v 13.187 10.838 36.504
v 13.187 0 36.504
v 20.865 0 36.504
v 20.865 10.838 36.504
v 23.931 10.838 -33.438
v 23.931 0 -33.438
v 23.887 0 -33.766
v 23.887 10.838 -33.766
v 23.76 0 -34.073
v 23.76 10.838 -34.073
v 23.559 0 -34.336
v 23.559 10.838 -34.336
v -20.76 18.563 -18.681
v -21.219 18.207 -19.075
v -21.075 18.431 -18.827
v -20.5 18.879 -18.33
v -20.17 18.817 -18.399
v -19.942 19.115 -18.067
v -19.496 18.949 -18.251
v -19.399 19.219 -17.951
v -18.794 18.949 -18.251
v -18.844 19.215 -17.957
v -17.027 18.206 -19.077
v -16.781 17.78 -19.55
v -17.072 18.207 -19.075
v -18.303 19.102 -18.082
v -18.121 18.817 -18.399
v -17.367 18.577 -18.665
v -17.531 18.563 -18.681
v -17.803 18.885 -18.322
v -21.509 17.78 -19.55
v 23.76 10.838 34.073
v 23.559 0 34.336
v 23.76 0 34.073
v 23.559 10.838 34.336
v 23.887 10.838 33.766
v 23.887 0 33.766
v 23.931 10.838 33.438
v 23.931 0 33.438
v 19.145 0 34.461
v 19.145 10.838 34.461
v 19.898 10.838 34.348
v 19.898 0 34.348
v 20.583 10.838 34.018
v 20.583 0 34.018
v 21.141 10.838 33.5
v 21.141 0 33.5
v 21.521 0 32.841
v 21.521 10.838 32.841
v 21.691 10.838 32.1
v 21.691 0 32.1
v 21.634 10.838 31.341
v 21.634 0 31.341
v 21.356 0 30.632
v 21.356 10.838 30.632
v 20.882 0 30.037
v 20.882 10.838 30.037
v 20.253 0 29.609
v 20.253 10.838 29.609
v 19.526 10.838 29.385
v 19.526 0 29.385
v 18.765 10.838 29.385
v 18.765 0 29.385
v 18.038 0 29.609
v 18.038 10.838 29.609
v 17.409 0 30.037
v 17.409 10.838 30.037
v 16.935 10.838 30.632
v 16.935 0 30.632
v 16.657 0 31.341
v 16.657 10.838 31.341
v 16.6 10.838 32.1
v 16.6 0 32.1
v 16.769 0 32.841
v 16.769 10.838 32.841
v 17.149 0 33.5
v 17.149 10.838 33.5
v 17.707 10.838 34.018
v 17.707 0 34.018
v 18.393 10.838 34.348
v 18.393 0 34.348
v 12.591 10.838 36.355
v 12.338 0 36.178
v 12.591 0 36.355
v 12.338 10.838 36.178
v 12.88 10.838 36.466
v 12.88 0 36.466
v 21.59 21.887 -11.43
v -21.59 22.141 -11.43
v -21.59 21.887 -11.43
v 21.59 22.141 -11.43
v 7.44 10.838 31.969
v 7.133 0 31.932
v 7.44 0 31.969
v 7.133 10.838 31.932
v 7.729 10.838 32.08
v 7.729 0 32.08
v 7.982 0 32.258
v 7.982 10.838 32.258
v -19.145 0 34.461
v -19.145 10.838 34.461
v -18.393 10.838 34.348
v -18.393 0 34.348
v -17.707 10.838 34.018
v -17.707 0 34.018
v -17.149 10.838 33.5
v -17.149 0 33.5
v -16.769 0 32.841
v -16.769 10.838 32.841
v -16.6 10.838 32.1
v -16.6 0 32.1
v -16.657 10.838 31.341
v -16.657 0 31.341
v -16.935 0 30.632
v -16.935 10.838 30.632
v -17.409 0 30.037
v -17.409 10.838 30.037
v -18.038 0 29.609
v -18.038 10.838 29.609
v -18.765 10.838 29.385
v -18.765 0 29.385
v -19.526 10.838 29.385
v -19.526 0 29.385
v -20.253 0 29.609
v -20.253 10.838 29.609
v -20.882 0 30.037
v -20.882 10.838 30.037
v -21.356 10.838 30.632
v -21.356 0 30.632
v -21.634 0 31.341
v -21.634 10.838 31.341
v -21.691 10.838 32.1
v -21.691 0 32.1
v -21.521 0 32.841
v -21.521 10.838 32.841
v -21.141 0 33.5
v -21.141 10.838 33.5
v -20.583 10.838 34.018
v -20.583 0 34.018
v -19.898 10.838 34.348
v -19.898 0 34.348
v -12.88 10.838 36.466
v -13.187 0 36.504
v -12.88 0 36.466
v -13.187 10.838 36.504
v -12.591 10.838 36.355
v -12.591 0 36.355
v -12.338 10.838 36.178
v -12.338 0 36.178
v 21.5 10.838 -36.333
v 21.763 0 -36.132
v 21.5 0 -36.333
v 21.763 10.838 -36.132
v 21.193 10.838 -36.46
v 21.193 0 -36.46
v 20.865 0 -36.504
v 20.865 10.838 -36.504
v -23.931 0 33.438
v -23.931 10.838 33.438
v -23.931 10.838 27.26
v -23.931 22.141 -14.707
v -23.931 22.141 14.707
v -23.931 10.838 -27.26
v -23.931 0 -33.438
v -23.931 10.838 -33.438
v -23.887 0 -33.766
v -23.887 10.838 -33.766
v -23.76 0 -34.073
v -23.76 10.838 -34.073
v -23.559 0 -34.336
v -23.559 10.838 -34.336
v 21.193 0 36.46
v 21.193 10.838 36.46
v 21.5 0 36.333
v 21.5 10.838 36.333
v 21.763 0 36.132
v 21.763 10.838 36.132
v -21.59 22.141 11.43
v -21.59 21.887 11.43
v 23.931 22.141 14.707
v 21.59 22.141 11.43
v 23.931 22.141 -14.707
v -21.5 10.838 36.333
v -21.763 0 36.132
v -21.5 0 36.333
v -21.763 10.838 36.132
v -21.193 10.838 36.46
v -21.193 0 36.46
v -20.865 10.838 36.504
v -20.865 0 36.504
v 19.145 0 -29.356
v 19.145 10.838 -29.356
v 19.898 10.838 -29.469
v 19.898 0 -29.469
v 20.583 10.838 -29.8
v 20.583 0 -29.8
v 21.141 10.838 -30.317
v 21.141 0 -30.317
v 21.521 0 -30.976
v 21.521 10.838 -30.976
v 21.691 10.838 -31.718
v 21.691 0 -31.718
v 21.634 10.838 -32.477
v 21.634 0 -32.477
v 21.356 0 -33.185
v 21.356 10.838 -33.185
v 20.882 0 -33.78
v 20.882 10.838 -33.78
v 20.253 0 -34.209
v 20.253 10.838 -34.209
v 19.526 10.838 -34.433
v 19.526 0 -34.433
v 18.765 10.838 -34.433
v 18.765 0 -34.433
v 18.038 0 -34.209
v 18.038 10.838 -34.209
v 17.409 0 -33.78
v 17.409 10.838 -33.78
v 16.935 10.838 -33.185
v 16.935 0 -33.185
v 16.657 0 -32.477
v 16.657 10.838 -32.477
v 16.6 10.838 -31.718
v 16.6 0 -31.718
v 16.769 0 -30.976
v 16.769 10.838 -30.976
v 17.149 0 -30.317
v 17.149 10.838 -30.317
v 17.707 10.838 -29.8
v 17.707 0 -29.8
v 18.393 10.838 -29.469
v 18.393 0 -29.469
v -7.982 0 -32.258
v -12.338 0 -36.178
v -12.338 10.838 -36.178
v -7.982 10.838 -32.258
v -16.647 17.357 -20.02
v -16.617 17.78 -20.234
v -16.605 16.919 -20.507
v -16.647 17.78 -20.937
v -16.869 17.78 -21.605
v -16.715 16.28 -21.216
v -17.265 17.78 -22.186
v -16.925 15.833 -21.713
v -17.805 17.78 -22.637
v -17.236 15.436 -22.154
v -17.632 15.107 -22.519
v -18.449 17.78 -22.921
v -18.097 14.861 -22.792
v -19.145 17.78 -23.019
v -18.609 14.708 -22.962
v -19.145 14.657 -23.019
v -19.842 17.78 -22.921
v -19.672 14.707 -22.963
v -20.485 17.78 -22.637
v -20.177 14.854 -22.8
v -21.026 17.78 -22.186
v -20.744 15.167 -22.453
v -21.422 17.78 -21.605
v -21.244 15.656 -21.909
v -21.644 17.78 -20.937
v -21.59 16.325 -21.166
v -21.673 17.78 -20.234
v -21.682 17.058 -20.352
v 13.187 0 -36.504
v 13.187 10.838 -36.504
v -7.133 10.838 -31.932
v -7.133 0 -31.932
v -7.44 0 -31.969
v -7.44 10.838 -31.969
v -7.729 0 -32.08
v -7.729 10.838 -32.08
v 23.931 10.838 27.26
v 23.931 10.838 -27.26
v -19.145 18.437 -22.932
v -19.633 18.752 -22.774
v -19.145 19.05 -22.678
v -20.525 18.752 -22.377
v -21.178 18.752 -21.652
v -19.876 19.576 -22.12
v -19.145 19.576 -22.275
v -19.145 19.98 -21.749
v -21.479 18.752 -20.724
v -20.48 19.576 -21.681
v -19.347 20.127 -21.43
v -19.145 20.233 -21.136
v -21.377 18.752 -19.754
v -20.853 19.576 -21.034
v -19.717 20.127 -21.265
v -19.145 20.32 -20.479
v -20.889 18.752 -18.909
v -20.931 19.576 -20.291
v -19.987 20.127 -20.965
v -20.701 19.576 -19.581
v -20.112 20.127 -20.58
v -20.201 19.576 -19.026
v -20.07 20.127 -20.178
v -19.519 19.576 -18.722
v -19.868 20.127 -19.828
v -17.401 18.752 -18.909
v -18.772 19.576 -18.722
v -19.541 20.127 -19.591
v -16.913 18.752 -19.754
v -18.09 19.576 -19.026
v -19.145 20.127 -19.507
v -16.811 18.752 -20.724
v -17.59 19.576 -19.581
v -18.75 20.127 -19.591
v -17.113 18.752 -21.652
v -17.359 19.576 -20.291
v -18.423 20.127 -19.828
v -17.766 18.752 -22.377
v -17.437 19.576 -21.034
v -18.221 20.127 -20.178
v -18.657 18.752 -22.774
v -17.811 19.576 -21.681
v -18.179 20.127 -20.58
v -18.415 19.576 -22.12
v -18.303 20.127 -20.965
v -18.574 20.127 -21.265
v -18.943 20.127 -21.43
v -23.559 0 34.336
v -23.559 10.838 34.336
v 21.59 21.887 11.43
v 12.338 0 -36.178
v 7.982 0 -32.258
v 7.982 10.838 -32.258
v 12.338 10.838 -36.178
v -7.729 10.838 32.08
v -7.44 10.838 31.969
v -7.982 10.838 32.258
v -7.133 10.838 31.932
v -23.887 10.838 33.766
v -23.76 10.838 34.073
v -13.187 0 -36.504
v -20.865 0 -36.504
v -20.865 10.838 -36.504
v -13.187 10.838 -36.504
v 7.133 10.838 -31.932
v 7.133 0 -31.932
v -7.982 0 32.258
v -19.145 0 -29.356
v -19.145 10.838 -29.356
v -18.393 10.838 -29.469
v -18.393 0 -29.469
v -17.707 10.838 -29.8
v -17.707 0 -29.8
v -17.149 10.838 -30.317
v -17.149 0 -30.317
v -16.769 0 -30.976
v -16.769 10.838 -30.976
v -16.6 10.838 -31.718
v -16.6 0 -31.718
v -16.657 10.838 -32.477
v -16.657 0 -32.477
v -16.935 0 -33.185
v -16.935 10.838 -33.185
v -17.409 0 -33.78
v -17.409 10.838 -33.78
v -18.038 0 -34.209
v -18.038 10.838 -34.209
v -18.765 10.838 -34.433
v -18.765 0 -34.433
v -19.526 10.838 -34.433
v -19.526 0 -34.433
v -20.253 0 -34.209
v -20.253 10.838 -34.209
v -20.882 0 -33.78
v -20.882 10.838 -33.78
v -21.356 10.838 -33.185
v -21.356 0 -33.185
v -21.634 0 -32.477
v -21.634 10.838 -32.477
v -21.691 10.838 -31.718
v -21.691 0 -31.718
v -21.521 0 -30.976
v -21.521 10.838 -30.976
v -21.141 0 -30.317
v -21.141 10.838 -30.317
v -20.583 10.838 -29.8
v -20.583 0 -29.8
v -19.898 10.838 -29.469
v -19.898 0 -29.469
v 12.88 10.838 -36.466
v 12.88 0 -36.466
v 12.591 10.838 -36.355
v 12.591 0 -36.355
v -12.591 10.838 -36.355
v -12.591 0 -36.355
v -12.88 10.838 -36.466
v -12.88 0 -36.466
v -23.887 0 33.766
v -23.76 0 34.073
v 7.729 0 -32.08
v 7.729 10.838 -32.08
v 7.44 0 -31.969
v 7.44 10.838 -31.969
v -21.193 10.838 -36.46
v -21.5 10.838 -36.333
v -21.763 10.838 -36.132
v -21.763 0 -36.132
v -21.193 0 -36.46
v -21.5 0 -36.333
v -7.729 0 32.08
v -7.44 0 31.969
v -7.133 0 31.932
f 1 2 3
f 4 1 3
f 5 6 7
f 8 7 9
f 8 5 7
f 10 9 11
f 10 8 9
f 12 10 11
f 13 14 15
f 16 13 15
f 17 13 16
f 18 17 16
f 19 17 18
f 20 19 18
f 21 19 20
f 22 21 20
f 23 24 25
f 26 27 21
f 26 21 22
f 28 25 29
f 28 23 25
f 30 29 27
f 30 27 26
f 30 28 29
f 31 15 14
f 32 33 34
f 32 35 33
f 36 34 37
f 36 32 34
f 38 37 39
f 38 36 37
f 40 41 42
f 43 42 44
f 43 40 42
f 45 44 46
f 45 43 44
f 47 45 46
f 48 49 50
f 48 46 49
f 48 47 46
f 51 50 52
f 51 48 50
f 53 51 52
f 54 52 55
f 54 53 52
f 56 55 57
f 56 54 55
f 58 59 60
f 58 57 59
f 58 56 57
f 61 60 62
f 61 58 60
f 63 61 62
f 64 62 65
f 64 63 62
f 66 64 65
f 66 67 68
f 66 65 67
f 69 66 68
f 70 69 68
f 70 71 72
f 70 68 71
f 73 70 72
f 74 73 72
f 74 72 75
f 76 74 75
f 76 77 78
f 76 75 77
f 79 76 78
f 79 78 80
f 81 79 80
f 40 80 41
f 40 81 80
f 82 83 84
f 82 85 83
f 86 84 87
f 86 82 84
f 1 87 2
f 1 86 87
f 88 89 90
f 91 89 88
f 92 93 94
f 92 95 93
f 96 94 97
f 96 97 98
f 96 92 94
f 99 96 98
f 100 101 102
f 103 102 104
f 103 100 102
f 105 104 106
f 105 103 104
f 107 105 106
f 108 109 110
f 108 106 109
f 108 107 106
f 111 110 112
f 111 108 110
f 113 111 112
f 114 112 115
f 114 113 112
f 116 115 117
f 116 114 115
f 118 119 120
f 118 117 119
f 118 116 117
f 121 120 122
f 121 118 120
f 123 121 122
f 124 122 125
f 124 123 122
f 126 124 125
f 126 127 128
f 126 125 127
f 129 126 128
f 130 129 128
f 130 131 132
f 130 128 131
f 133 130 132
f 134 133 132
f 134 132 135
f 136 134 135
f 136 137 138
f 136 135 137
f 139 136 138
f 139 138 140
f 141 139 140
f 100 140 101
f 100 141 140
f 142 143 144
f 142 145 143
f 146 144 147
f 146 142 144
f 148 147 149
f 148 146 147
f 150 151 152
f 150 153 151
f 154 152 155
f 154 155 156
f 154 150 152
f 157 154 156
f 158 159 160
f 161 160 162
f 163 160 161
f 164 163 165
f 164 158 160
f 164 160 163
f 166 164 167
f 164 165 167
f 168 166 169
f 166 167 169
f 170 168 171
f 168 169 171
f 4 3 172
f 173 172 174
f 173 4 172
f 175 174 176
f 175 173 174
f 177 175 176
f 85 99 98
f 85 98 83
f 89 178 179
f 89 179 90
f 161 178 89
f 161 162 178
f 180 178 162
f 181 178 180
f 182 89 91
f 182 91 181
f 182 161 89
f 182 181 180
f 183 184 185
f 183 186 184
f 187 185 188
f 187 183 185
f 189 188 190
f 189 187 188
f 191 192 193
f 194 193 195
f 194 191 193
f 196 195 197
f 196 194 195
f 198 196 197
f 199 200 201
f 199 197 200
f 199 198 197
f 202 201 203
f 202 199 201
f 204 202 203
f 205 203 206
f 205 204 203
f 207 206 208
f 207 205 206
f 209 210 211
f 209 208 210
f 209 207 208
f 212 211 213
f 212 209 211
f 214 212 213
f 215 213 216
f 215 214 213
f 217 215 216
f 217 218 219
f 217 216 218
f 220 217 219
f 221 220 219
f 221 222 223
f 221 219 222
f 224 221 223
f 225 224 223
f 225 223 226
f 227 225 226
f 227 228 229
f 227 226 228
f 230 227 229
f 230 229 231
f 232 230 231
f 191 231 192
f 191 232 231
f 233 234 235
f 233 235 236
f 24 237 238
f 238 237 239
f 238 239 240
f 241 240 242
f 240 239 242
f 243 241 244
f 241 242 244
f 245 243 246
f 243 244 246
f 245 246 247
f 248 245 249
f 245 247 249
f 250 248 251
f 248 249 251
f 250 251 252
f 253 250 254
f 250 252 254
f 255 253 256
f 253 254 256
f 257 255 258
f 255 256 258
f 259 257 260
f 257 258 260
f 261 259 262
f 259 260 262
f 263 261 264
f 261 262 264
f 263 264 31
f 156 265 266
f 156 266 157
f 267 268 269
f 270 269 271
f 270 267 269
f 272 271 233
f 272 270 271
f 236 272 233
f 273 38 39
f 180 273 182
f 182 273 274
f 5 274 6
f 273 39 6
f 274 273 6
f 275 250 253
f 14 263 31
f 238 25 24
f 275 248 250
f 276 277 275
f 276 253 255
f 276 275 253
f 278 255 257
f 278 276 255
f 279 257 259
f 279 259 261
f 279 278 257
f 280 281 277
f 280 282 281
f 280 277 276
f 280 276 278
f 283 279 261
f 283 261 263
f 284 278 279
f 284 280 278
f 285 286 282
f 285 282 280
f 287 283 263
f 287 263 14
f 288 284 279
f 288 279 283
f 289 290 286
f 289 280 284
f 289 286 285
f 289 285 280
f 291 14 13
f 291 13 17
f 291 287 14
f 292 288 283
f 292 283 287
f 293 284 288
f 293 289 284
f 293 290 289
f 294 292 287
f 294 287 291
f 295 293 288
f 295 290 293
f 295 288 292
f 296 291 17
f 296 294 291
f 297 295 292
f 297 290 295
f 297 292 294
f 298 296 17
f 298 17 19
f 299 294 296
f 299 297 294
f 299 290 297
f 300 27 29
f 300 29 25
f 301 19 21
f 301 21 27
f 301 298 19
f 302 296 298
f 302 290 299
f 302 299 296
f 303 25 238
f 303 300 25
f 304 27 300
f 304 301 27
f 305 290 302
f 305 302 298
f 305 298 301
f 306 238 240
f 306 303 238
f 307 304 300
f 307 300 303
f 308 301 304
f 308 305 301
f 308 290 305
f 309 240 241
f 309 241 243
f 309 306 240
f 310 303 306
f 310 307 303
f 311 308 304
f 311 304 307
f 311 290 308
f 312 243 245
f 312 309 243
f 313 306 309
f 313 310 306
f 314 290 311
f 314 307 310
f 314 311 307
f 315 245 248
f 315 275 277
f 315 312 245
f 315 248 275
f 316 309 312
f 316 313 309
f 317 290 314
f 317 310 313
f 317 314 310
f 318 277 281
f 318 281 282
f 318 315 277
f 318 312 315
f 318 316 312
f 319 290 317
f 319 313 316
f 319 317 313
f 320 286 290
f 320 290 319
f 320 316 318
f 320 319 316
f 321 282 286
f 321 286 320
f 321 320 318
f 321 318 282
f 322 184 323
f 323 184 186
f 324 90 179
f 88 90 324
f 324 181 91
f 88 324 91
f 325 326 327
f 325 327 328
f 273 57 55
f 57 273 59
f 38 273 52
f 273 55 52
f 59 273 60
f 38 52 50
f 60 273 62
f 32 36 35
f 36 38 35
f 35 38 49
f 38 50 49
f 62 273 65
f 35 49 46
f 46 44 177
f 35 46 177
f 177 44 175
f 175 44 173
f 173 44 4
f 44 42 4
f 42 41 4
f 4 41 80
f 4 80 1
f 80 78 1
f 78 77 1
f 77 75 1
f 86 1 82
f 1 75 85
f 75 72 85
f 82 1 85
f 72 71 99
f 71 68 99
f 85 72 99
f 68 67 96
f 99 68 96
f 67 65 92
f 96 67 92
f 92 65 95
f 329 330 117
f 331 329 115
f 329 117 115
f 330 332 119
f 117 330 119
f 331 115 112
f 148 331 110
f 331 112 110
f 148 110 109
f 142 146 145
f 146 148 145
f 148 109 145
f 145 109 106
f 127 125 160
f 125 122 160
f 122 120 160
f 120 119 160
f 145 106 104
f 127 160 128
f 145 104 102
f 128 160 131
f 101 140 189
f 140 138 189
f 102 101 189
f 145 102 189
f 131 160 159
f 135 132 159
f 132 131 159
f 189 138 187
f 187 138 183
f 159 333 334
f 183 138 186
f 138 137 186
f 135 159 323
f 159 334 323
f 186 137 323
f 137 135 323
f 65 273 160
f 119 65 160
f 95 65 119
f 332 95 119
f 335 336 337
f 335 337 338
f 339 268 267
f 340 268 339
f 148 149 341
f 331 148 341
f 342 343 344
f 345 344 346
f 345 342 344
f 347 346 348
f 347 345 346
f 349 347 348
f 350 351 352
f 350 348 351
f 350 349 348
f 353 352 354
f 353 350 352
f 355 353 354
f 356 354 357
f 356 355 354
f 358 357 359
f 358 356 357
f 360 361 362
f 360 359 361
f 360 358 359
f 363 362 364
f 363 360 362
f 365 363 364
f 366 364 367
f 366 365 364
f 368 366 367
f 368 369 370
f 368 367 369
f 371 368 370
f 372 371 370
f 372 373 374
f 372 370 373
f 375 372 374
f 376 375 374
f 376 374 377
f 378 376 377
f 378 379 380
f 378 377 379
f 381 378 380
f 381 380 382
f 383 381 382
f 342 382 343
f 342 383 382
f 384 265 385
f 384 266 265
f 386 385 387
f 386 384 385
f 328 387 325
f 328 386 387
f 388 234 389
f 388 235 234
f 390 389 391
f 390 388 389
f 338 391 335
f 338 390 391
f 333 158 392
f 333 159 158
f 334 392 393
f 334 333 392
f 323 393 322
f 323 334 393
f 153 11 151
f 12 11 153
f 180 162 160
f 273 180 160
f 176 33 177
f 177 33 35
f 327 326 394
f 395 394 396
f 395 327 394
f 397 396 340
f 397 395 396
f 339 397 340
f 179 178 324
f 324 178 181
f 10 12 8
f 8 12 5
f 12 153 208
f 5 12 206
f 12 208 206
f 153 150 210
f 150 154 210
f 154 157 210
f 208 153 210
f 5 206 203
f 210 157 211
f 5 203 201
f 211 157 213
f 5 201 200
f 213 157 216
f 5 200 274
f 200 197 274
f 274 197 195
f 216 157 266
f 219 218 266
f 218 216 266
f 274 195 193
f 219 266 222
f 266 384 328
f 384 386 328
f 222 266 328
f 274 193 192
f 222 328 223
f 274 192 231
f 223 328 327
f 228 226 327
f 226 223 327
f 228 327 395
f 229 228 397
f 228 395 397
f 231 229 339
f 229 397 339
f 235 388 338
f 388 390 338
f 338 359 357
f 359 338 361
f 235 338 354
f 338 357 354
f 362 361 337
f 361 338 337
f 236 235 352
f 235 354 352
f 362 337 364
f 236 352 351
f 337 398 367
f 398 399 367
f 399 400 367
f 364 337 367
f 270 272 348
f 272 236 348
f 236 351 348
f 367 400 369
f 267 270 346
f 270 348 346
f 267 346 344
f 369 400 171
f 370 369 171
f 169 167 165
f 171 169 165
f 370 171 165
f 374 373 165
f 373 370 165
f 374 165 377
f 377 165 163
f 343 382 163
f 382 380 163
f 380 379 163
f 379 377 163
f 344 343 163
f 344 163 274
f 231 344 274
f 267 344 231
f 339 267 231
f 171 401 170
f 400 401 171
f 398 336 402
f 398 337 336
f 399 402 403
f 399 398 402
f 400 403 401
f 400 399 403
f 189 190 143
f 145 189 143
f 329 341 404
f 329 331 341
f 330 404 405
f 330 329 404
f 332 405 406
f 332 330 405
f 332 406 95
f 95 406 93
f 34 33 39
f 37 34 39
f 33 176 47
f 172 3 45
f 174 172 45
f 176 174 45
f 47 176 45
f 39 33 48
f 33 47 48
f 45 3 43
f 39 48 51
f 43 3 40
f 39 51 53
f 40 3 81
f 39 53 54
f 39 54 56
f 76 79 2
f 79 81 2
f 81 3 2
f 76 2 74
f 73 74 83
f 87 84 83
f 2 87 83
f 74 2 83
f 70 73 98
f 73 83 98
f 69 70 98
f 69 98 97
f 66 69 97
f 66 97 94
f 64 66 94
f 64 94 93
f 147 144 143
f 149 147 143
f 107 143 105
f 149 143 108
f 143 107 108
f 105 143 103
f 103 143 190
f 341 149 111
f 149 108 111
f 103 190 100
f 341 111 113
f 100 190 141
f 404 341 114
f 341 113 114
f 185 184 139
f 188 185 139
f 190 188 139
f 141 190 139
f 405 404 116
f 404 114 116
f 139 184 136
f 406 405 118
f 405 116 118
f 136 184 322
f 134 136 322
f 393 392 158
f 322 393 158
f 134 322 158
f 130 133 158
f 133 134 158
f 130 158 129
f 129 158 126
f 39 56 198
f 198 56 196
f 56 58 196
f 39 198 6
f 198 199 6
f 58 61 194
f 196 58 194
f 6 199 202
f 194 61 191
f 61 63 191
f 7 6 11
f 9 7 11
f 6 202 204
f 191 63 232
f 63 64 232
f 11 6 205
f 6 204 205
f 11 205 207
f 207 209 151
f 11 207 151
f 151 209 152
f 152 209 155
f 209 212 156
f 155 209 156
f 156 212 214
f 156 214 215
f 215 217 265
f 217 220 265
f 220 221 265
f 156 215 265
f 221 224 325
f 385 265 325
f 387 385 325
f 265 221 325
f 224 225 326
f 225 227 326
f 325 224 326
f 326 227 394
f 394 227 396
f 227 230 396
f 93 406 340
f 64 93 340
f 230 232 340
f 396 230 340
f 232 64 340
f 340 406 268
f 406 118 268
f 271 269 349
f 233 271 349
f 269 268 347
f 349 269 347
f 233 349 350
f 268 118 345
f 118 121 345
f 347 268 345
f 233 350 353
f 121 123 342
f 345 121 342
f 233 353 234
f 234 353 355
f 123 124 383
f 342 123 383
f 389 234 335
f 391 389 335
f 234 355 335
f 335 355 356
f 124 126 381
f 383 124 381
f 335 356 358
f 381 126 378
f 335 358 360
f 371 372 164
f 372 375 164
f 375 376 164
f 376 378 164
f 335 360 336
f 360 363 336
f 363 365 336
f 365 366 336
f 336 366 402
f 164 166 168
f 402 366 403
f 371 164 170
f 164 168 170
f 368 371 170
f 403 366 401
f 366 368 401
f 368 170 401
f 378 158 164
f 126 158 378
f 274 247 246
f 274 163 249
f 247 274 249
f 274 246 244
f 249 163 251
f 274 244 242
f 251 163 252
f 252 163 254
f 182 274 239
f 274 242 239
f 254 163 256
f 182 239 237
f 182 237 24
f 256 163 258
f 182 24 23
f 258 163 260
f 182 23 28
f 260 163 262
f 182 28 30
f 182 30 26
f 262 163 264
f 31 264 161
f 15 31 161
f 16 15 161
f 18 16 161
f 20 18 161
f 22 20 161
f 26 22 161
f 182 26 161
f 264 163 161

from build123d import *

# Parameters (mm, degrees)
SKETCH1_W               = 47.86122
SKETCH1_H               = 73.00722
SKETCH1_R               = 2.5527
BOSS_EXTRUDE1_DEPTH     = 22.14118
CUT_EXTRUDE1_DEPTH      = 49.943022892
CUT_EXTRUDE1_DEPTH_BACK = 49.943022892
CHAMFER1_SIZE           = 2.54
CUT_EXTRUDE2_DEPTH      = 49.943022892
SKETCH5_W               = 43.18
SKETCH5_H               = 22.86
CUT_EXTRUDE3_DEPTH      = 0.254
SKETCH7_R               = 2.54
BOSS_EXTRUDE3_DEPTH     = 20.32
FILLET1_R               = 2.54
FILLET2_R               = 1.27


with BuildPart() as part:
    # Sketch1 → Boss-Extrude1 (new body)
    with BuildSketch(Plane(origin=(0, 0, 0), x_dir=(1, 0, 0), z_dir=(0, 1, 0))):
        Rectangle(SKETCH1_W, SKETCH1_H)
        with Locations(Location((-19.14525, 31.90875, 0), (0, 0, 270))):
            Circle(SKETCH1_R, mode=Mode.SUBTRACT)
        with Locations(Location((19.14525, 31.90875, 0), (0, 0, 270))):
            Circle(SKETCH1_R, mode=Mode.SUBTRACT)
        with Locations(Location((19.14525, -31.90875, 0), (0, 0, 270))):
            Circle(SKETCH1_R, mode=Mode.SUBTRACT)
        with Locations(Location((-19.14525, -31.90875, 0), (0, 0, 270))):
            Circle(SKETCH1_R, mode=Mode.SUBTRACT)
    extrude(amount=BOSS_EXTRUDE1_DEPTH)

    # Sketch2 → Cut-Extrude1 (cut, two sides: drawn at the far end of the back side and taken through both)
    with BuildSketch(Plane(origin=(0, 0, 0), x_dir=(0, 0, -1), z_dir=(1, 0, 0)).offset(-CUT_EXTRUDE1_DEPTH_BACK)):
        Polygon((14.7066, 22.14118), (-14.7066, 22.14118), (-27.259853255, 10.83818), (-36.50361, 10.83818), (-45.550551374, 42.074053009), (0, 43.630244296), (45.550551374, 42.074053009), (36.50361, 10.83818), (27.259853255, 10.83818), align=None)
    extrude(amount=CUT_EXTRUDE1_DEPTH + CUT_EXTRUDE1_DEPTH_BACK, mode=Mode.SUBTRACT)

    # Chamfer1
    chamfer1_edges = [part.edges().sort_by_distance(p)[0] for p in [
        (-23.93061, 5.41909, -36.50361),
        (23.93061, 5.41909, -36.50361),
        (23.93061, 5.41909, 36.50361),
        (-23.93061, 5.41909, 36.50361),
    ]]
    chamfer(chamfer1_edges, length=CHAMFER1_SIZE)

    # Sketch4 → Cut-Extrude2 (cut, through all)
    with BuildSketch(Plane(origin=(0, 0, 0), x_dir=(1, 0, 0), z_dir=(0, 1, 0))):
        Polygon((-12.7, 36.50361), (-7.62, 31.93161), (7.62, 31.93161), (12.7, 36.50361), align=None)
        Polygon((-12.7, -36.50361), (-7.62, -31.93161), (7.62, -31.93161), (12.7, -36.50361), align=None)
    extrude(amount=CUT_EXTRUDE2_DEPTH, mode=Mode.SUBTRACT)

    # Sketch5 → Cut-Extrude3 (cut)
    with BuildSketch(Plane(origin=(0, 22.14118, 0), x_dir=(1, 0, 0), z_dir=(0, 1, 0))):
        Rectangle(SKETCH5_W, SKETCH5_H)
    extrude(amount=-CUT_EXTRUDE3_DEPTH, mode=Mode.SUBTRACT)

    # Sketch7 → Boss-Extrude3 (add)
    with BuildSketch(Plane(origin=(0, 0, 0), x_dir=(1, 0, 0), z_dir=(0, 1, 0))):
        with Locations(Location((-19.14525, 20.47875, 0), (0, 0, 90))):
            Circle(SKETCH7_R)
    extrude(amount=BOSS_EXTRUDE3_DEPTH)

    # Fillet1
    # the kernel refuses this fillet: 2.54 mm, written as the material it takes off along each edge
    with BuildSketch(Plane(origin=(-19.14525, 20.32, -20.47875), x_dir=(0, 0, -1), z_dir=(1, 0, 0))) as fillet1_piece_1_section:
        with BuildLine():
            CenterArc((2.54 - FILLET1_R, -FILLET1_R), FILLET1_R, 0, 90)
            Line((2.54 - FILLET1_R, 0), (2.54, 0))
            Line((2.54, 0), (2.54, -FILLET1_R))
        make_face()
    fillet1_piece_1 = revolve(axis=Axis((-19.14525, 20.32, -20.47875), (0, 1, 0)), mode=Mode.PRIVATE)
    fillet1_piece_1 = split(fillet1_piece_1, bisect_by=Plane(origin=(-19.14525, 19.033531864, -18.157992912), z_dir=(0, 0.7431448254773929, -0.6691306063588597)), keep=Keep.TOP, mode=Mode.PRIVATE)
    add(fillet1_piece_1, mode=Mode.SUBTRACT)

    # Fillet2
    fillet2_edges = [part.edges().sort_by_distance(p)[0] for p in [
        (-12.7, 5.41909, 36.50361),
        (12.7, 5.41909, 36.50361),
        (7.62, 5.41909, 31.93161),
        (-7.62, 5.41909, 31.93161),
        (-23.93061, 5.41909, 33.96361),
        (-23.93061, 5.41909, -33.96361),
        (21.39061, 5.41909, -36.50361),
        (-21.39061, 5.41909, -36.50361),
        (23.93061, 5.41909, 33.96361),
        (23.93061, 5.41909, -33.96361),
        (21.39061, 5.41909, 36.50361),
        (-21.39061, 5.41909, 36.50361),
        (12.7, 5.41909, -36.50361),
        (-12.7, 5.41909, -36.50361),
        (-7.62, 5.41909, -31.93161),
        (7.62, 5.41909, -31.93161),
    ]]
    fillet(fillet2_edges, radius=FILLET2_R)


solid = part.part
